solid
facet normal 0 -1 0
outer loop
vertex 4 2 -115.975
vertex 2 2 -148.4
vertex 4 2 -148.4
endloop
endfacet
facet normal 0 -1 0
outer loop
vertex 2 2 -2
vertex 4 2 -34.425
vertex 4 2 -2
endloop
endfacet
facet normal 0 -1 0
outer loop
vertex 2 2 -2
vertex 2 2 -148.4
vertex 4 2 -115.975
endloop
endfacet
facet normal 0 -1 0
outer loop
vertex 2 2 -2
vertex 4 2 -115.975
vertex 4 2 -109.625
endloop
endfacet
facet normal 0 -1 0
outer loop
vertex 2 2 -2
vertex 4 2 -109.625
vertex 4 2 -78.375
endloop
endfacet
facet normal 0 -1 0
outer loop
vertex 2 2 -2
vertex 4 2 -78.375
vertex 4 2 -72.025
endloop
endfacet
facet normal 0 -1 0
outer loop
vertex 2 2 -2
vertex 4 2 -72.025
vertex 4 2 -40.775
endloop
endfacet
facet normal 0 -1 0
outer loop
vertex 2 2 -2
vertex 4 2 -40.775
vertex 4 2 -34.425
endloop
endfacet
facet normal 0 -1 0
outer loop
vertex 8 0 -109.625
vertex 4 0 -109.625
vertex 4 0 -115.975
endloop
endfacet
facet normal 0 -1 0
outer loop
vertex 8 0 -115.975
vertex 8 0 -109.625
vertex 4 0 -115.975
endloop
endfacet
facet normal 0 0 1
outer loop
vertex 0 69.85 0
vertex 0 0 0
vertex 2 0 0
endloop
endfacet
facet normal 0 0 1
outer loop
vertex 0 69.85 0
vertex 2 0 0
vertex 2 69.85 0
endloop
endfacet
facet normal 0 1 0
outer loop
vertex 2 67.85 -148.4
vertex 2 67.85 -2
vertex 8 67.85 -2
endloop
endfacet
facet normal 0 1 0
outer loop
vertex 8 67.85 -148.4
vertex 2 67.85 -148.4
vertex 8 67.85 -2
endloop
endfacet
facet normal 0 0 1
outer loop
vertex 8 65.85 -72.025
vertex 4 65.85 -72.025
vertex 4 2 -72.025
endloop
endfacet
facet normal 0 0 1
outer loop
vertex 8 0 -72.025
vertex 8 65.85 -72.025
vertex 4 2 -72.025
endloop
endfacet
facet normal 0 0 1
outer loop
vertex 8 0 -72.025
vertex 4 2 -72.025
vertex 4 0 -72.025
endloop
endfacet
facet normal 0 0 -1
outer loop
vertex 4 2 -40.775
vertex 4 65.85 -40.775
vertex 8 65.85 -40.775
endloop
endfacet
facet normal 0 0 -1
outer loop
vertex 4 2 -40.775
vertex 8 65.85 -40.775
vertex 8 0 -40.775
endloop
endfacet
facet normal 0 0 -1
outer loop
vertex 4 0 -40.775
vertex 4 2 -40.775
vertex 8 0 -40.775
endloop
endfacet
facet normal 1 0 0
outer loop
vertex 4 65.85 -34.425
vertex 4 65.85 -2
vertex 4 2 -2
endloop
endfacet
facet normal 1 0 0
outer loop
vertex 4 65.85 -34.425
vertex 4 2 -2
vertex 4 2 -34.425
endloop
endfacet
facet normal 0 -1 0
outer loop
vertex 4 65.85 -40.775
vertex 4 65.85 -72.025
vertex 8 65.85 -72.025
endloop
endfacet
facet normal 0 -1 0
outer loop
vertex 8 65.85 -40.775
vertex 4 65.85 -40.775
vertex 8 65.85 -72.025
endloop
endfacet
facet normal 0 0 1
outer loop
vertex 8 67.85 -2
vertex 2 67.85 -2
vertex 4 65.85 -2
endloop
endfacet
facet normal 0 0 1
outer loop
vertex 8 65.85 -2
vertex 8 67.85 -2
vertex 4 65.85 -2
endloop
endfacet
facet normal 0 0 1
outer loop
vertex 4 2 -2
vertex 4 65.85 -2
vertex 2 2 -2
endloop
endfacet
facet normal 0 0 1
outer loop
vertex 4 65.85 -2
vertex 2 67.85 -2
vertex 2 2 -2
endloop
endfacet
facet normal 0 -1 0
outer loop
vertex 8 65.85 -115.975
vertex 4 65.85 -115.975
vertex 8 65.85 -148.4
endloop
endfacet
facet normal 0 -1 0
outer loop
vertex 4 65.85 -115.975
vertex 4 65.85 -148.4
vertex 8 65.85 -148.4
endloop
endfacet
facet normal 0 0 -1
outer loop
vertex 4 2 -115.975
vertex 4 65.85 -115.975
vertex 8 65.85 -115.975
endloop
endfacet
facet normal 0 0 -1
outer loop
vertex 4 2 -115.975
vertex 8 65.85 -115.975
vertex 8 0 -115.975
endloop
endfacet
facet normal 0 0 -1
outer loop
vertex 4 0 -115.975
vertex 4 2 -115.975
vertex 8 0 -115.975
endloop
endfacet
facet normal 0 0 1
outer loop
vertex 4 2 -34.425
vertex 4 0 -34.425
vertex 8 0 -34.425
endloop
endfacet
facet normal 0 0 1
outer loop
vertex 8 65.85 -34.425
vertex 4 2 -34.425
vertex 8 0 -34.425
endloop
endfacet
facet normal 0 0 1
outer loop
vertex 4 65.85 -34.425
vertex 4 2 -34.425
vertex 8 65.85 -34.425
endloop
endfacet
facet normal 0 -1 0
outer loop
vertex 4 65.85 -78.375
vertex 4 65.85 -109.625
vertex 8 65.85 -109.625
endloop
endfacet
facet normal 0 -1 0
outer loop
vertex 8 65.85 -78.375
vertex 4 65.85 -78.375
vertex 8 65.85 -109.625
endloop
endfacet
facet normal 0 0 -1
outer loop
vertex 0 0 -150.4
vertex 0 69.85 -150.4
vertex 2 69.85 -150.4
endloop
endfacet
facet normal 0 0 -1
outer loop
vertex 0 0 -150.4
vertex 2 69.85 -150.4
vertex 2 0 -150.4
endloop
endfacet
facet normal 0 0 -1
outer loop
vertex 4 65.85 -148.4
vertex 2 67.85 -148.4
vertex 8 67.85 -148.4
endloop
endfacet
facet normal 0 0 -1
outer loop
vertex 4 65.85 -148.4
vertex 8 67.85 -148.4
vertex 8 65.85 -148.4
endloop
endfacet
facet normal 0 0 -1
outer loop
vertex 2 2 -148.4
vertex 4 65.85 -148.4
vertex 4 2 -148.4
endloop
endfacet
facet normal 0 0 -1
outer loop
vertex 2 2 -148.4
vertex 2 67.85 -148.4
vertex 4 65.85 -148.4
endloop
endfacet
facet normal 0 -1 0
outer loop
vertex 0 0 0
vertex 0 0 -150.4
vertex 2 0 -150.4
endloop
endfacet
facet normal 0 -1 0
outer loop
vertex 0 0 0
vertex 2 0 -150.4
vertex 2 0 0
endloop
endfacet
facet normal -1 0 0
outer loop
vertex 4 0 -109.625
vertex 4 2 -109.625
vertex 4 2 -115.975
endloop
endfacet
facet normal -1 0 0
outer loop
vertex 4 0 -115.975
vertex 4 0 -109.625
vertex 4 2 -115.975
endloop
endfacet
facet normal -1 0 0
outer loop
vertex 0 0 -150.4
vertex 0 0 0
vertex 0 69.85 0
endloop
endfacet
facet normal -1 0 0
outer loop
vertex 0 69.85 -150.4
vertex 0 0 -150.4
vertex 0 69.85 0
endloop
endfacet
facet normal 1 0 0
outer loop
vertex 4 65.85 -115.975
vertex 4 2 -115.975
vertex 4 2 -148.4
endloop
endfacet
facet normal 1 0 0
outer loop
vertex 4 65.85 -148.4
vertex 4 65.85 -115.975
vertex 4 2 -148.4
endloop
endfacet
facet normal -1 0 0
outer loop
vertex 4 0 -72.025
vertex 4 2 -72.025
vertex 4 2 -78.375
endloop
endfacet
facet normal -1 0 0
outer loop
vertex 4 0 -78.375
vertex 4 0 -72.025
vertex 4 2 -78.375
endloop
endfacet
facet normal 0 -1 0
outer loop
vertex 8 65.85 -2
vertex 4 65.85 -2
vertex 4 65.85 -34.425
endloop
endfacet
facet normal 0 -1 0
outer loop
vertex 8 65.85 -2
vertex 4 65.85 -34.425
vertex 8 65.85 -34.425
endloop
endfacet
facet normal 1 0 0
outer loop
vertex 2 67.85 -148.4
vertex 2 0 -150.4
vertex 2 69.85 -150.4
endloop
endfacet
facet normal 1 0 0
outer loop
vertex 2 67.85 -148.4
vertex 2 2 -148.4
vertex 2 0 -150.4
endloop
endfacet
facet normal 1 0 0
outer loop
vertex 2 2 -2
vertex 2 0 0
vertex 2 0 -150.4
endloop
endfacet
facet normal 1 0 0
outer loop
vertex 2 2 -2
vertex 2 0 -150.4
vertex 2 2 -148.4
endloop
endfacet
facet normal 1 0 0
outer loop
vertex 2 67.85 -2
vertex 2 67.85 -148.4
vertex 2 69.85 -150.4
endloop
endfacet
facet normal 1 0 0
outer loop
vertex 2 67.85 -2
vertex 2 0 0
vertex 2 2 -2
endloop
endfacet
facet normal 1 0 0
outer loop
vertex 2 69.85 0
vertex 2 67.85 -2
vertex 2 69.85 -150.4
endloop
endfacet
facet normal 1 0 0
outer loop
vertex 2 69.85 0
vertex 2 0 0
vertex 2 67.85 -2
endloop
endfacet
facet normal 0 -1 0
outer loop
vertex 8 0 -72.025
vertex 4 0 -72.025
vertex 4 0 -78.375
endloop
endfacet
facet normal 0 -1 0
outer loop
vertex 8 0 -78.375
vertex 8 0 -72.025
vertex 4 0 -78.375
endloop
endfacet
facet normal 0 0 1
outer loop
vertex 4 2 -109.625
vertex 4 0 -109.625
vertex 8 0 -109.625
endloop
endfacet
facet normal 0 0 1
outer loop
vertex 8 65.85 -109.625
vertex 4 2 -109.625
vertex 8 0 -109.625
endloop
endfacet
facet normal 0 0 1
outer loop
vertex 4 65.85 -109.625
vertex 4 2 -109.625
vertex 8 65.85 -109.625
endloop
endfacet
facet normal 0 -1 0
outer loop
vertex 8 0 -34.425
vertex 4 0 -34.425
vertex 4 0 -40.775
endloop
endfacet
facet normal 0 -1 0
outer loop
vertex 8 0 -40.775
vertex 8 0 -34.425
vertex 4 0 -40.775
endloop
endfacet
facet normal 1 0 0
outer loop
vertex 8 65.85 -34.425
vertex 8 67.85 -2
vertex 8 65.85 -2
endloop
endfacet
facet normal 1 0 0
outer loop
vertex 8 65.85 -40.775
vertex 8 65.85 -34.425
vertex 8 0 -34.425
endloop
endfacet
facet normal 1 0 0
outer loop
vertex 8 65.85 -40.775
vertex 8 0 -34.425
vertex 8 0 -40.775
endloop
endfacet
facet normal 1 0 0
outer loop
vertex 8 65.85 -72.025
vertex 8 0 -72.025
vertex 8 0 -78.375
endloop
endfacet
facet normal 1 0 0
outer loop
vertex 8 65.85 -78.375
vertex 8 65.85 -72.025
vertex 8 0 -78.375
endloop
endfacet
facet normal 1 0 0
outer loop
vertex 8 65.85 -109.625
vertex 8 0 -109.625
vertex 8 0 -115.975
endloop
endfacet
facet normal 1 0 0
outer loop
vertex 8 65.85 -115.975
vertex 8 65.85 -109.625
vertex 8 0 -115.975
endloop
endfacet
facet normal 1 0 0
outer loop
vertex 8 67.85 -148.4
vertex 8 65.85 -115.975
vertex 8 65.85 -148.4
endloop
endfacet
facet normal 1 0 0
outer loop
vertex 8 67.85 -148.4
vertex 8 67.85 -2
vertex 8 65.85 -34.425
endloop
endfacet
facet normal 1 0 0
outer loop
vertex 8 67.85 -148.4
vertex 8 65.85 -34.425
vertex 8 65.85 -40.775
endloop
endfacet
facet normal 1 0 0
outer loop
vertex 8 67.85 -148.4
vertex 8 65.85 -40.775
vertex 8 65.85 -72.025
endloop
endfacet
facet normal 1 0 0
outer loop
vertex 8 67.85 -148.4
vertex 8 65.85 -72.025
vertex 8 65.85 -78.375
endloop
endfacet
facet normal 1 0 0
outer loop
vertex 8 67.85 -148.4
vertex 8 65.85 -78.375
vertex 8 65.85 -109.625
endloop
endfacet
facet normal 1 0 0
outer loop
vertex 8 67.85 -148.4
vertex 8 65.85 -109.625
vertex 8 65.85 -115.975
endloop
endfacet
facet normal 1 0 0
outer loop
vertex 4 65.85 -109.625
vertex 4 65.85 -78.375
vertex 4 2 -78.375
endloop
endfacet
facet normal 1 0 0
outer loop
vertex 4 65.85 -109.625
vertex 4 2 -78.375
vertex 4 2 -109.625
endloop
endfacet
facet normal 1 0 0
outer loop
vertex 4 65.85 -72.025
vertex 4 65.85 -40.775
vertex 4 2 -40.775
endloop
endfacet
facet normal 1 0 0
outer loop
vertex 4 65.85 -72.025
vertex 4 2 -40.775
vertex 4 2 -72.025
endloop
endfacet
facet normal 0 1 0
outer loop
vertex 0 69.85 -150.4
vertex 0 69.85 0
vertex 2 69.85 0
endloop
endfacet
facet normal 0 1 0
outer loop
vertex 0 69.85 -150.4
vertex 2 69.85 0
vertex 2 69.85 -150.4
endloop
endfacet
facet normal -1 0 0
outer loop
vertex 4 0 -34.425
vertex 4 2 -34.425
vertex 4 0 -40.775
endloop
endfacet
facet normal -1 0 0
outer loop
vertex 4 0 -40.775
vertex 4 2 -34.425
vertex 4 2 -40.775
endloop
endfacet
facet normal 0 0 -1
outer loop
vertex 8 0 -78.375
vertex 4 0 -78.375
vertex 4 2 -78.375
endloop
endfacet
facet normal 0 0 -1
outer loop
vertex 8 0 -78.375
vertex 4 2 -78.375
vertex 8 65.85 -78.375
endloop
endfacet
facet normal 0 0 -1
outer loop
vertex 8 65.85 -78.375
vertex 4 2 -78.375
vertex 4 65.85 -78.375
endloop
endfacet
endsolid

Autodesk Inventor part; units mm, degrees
ref_plane "YZ Plane" through (0, 0, 0) normal (1, 0, 0) x (0, 1, 0)
ref_plane "XZ Plane" through (0, 0, 0) normal (0, 1, 0) x (-1, 0, 0)
ref_plane "XY Plane" through (0, 0, 0) normal (0, 0, 1) x (1, 0, 0)
sketch "Sketch1" plane through (0, 0, 0) normal (1, 0, 0) x (0, 1, 0)
  line L0 (0, 0) -> (69.85, 0)
  line L1 (69.85, 0) -> (69.85, -150.4)
  line L2 (69.85, -150.4) -> (0, -150.4)
  line L3 (0, -150.4) -> (0, 0)
  dimension "d0" = 69.85
  dimension "d1" = 150.4
extrude "Extrusion1" add sketch "Sketch1" along normal blind 2
sketch "Sketch2" plane through (2, 0, 0) normal (1, 0, 0) x (0, 0, -1)
  line L0 (150.4, 0) -> (150.4, 69.85) projected
  line L1 (150.4, 69.85) -> (0, 69.85) projected
  line L2 (0, 69.85) -> (0, 0) projected
  line L3 (0, 0) -> (150.4, 0) projected
  line L4 (150.4, 69.85) -> (148.4, 69.85)
  line L5 (148.4, 69.85) -> (148.4, 0)
  line L6 (148.4, 0) -> (150.4, 0)
  line L7 (150.4, 0) -> (150.4, 69.85)
  line L8 (0, 69.85) -> (2, 69.85)
  line L9 (2, 69.85) -> (2, 0)
  line L10 (2, 0) -> (0, 0)
  line L11 (0, 0) -> (0, 69.85)
  line L12 (0, 0) -> (150.4, 0)
  line L13 (150.4, 0) -> (150.4, 2)
  line L14 (150.4, 2) -> (0, 2)
  line L15 (0, 2) -> (0, 0)
  point P0 (2, 2)
  point P1 (148.4, 2)
  dimension "d4" = 2
  dimension "d5" = 2
  dimension "d6" = 2
extrude "Extrusion2" add sketch "Sketch2" along normal blind 2 contours L14 L9 L1 L5
sketch "Sketch3" plane through (4, 0, 0) normal (1, 0, 0) x (0, 0, -1)
  line L0 (150.4, 0) -> (150.4, 69.85) projected
  line L1 (0, 0) -> (150.4, 0) projected
  line L2 (0, 69.85) -> (0, 0) projected
  line L3 (150.4, 69.85) -> (0, 69.85) projected
  line L4 (0, 69.85) -> (75.2, 69.85) construction
  line L5 (75.2, 69.85) -> (75.2, 0) construction
  line L6 (75.2, 0) -> (0, 0) construction
  line L7 (0, 0) -> (0, 69.85) construction
  line L8 (0, 0) -> (150.4, 0) construction
  line L9 (0, 0) -> (37.6, 0) construction
  line L10 (37.6, 0) -> (37.6, 69.85) construction
  line L11 (37.6, 69.85) -> (0, 69.85) construction
  line L12 (0, 69.85) -> (0, 0) construction
  line L13 (150.4, 0) -> (150.4, 69.85) construction
  line L14 (75.2, 69.85) -> (150.4, 69.85) construction
  line L15 (150.4, 69.85) -> (150.4, 0) construction
  line L16 (150.4, 0) -> (75.2, 0) construction
  line L17 (75.2, 0) -> (75.2, 69.85) construction
  line L18 (75.2, 0) -> (112.8, 0) construction
  line L19 (112.8, 0) -> (112.8, 69.85) construction
  line L20 (112.8, 69.85) -> (75.2, 69.85) construction
  line L21 (75.2, 69.85) -> (75.2, 0) construction
  line L22 (34.425, 0) -> (34.425, 69.85) construction
  line L23 (34.425, 69.85) -> (40.775, 69.85) construction
  line L24 (40.775, 69.85) -> (40.775, 0) construction
  line L25 (40.775, 0) -> (34.425, 0) construction
  line L26 (34.425, 0) -> (40.775, 69.85) construction
  line L27 (34.425, 69.85) -> (40.775, 0) construction
  line L28 (72.025, 0) -> (72.025, 69.85) construction
  line L29 (72.025, 69.85) -> (78.375, 69.85) construction
  line L30 (78.375, 69.85) -> (78.375, 0) construction
  line L31 (78.375, 0) -> (72.025, 0) construction
  line L32 (72.025, 0) -> (78.375, 69.85) construction
  line L33 (72.025, 69.85) -> (78.375, 0) construction
  line L34 (109.625, 0) -> (109.625, 69.85) construction
  line L35 (109.625, 69.85) -> (115.975, 69.85) construction
  line L36 (115.975, 69.85) -> (115.975, 0) construction
  line L37 (115.975, 0) -> (109.625, 0) construction
  line L38 (109.625, 0) -> (115.975, 69.85) construction
  line L39 (109.625, 69.85) -> (115.975, 0) construction
  line L40 (34.425, 69.85) -> (40.775, 69.85)
  line L41 (40.775, 69.85) -> (40.775, 0)
  line L42 (40.775, 0) -> (34.425, 0)
  line L43 (34.425, 0) -> (34.425, 69.85)
  line L44 (72.025, 0) -> (78.375, 0)
  line L45 (78.375, 0) -> (78.375, 69.85)
  line L46 (78.375, 69.85) -> (72.025, 69.85)
  line L47 (72.025, 69.85) -> (72.025, 0)
  line L48 (109.625, 69.85) -> (115.975, 69.85)
  line L49 (115.975, 69.85) -> (115.975, 0)
  line L50 (115.975, 0) -> (109.625, 0)
  line L51 (109.625, 0) -> (109.625, 69.85)
  point P0 (37.6, 34.925)
  point P1 (75.2, 34.925)
  point P2 (112.8, 34.925)
  dimension "d9" = 6.35
  dimension "d10" = 6.35
  dimension "d11" = 6.35
extrude "Extrusion3" add sketch "Sketch3" along normal blind 4 contours L1 L51 L3 L49 | L1 L47 L3 L45 | L1 L43 L3 L41
sketch "Sketch4" plane through (0, 69.85, 0) normal (0, 1, 0) x (1, 0, 0)
  line L0 (0, 150.4) -> (0, 0) projected
  line L1 (0, 150.4) -> (0, 0) construction
  line L2 (0, 0) -> (2, 0) construction
  line L3 (2, 2) -> (2, 0) construction
  line L4 (2, 2) -> (4, 2) construction
  line L5 (4, 34.425) -> (4, 2) construction
  line L6 (4, 34.425) -> (8, 34.425) construction
  line L7 (8, 40.775) -> (8, 34.425) construction
  line L8 (4, 40.775) -> (8, 40.775) construction
  line L9 (4, 72.025) -> (4, 40.775) construction
  line L10 (4, 72.025) -> (8, 72.025) construction
  line L11 (8, 78.375) -> (8, 72.025) construction
  line L12 (4, 78.375) -> (8, 78.375) construction
  line L13 (4, 109.625) -> (4, 78.375) construction
  line L14 (4, 109.625) -> (8, 109.625) construction
  line L15 (8, 115.975) -> (8, 109.625) construction
  line L16 (4, 115.975) -> (8, 115.975) construction
  line L17 (4, 148.4) -> (4, 115.975) construction
  line L18 (2, 148.4) -> (4, 148.4) construction
  line L19 (2, 150.4) -> (2, 148.4) construction
  line L20 (0, 150.4) -> (2, 150.4) construction
  line L21 (2, 0) -> (0, 0)
  line L22 (0, 0) -> (0, 150.4)
  line L23 (0, 150.4) -> (2, 150.4)
  line L24 (2, 150.4) -> (2, 0)
  line L25 (2, 0) -> (8, 0)
  line L26 (8, 0) -> (8, 150.4)
  line L27 (8, 150.4) -> (2, 150.4)
  line L28 (2, 150.4) -> (2, 0)
extrude "Extrusion4" cut sketch "Sketch4" against normal blind 2 contours L27 L26 L25 L24
sketch "Sketch5" plane through (0, 67.85, 0) normal (0, 1, 0) x (1, 0, 0)
  line L0 (4, 115.975) -> (8, 115.975) projected
  line L1 (4, 148.4) -> (4, 115.975) projected
  line L2 (2, 148.4) -> (4, 148.4) projected
  line L3 (2, 2) -> (2, 148.4) projected
  line L4 (4, 2) -> (2, 2) projected
  line L5 (4, 34.425) -> (4, 2) projected
  line L6 (8, 34.425) -> (4, 34.425) projected
  line L7 (8, 40.775) -> (8, 34.425) projected
  line L8 (4, 40.775) -> (8, 40.775) projected
  line L9 (4, 72.025) -> (4, 40.775) projected
  line L10 (8, 72.025) -> (4, 72.025) projected
  line L11 (8, 78.375) -> (8, 72.025) projected
  line L12 (4, 78.375) -> (8, 78.375) projected
  line L13 (4, 109.625) -> (4, 78.375) projected
  line L14 (8, 109.625) -> (4, 109.625) projected
  line L15 (8, 115.975) -> (8, 109.625) projected
  line L16 (2, 2) -> (4, 2) projected
  line L17 (2, 2) -> (8, 2)
  line L18 (8, 2) -> (8, 148.4)
  line L19 (8, 148.4) -> (2, 148.4)
  line L20 (2, 148.4) -> (2, 2)
  point P0 (0, 0)
  point P1 (4, 2)
extrude "Extrusion5" add sketch "Sketch5" against normal blind 2 contours L1 L19 L18 L0 | L18 L12 L13 L14 | L18 L8 L9 L10 | L5 L6 L18 L17
properties part number "leftwall"
